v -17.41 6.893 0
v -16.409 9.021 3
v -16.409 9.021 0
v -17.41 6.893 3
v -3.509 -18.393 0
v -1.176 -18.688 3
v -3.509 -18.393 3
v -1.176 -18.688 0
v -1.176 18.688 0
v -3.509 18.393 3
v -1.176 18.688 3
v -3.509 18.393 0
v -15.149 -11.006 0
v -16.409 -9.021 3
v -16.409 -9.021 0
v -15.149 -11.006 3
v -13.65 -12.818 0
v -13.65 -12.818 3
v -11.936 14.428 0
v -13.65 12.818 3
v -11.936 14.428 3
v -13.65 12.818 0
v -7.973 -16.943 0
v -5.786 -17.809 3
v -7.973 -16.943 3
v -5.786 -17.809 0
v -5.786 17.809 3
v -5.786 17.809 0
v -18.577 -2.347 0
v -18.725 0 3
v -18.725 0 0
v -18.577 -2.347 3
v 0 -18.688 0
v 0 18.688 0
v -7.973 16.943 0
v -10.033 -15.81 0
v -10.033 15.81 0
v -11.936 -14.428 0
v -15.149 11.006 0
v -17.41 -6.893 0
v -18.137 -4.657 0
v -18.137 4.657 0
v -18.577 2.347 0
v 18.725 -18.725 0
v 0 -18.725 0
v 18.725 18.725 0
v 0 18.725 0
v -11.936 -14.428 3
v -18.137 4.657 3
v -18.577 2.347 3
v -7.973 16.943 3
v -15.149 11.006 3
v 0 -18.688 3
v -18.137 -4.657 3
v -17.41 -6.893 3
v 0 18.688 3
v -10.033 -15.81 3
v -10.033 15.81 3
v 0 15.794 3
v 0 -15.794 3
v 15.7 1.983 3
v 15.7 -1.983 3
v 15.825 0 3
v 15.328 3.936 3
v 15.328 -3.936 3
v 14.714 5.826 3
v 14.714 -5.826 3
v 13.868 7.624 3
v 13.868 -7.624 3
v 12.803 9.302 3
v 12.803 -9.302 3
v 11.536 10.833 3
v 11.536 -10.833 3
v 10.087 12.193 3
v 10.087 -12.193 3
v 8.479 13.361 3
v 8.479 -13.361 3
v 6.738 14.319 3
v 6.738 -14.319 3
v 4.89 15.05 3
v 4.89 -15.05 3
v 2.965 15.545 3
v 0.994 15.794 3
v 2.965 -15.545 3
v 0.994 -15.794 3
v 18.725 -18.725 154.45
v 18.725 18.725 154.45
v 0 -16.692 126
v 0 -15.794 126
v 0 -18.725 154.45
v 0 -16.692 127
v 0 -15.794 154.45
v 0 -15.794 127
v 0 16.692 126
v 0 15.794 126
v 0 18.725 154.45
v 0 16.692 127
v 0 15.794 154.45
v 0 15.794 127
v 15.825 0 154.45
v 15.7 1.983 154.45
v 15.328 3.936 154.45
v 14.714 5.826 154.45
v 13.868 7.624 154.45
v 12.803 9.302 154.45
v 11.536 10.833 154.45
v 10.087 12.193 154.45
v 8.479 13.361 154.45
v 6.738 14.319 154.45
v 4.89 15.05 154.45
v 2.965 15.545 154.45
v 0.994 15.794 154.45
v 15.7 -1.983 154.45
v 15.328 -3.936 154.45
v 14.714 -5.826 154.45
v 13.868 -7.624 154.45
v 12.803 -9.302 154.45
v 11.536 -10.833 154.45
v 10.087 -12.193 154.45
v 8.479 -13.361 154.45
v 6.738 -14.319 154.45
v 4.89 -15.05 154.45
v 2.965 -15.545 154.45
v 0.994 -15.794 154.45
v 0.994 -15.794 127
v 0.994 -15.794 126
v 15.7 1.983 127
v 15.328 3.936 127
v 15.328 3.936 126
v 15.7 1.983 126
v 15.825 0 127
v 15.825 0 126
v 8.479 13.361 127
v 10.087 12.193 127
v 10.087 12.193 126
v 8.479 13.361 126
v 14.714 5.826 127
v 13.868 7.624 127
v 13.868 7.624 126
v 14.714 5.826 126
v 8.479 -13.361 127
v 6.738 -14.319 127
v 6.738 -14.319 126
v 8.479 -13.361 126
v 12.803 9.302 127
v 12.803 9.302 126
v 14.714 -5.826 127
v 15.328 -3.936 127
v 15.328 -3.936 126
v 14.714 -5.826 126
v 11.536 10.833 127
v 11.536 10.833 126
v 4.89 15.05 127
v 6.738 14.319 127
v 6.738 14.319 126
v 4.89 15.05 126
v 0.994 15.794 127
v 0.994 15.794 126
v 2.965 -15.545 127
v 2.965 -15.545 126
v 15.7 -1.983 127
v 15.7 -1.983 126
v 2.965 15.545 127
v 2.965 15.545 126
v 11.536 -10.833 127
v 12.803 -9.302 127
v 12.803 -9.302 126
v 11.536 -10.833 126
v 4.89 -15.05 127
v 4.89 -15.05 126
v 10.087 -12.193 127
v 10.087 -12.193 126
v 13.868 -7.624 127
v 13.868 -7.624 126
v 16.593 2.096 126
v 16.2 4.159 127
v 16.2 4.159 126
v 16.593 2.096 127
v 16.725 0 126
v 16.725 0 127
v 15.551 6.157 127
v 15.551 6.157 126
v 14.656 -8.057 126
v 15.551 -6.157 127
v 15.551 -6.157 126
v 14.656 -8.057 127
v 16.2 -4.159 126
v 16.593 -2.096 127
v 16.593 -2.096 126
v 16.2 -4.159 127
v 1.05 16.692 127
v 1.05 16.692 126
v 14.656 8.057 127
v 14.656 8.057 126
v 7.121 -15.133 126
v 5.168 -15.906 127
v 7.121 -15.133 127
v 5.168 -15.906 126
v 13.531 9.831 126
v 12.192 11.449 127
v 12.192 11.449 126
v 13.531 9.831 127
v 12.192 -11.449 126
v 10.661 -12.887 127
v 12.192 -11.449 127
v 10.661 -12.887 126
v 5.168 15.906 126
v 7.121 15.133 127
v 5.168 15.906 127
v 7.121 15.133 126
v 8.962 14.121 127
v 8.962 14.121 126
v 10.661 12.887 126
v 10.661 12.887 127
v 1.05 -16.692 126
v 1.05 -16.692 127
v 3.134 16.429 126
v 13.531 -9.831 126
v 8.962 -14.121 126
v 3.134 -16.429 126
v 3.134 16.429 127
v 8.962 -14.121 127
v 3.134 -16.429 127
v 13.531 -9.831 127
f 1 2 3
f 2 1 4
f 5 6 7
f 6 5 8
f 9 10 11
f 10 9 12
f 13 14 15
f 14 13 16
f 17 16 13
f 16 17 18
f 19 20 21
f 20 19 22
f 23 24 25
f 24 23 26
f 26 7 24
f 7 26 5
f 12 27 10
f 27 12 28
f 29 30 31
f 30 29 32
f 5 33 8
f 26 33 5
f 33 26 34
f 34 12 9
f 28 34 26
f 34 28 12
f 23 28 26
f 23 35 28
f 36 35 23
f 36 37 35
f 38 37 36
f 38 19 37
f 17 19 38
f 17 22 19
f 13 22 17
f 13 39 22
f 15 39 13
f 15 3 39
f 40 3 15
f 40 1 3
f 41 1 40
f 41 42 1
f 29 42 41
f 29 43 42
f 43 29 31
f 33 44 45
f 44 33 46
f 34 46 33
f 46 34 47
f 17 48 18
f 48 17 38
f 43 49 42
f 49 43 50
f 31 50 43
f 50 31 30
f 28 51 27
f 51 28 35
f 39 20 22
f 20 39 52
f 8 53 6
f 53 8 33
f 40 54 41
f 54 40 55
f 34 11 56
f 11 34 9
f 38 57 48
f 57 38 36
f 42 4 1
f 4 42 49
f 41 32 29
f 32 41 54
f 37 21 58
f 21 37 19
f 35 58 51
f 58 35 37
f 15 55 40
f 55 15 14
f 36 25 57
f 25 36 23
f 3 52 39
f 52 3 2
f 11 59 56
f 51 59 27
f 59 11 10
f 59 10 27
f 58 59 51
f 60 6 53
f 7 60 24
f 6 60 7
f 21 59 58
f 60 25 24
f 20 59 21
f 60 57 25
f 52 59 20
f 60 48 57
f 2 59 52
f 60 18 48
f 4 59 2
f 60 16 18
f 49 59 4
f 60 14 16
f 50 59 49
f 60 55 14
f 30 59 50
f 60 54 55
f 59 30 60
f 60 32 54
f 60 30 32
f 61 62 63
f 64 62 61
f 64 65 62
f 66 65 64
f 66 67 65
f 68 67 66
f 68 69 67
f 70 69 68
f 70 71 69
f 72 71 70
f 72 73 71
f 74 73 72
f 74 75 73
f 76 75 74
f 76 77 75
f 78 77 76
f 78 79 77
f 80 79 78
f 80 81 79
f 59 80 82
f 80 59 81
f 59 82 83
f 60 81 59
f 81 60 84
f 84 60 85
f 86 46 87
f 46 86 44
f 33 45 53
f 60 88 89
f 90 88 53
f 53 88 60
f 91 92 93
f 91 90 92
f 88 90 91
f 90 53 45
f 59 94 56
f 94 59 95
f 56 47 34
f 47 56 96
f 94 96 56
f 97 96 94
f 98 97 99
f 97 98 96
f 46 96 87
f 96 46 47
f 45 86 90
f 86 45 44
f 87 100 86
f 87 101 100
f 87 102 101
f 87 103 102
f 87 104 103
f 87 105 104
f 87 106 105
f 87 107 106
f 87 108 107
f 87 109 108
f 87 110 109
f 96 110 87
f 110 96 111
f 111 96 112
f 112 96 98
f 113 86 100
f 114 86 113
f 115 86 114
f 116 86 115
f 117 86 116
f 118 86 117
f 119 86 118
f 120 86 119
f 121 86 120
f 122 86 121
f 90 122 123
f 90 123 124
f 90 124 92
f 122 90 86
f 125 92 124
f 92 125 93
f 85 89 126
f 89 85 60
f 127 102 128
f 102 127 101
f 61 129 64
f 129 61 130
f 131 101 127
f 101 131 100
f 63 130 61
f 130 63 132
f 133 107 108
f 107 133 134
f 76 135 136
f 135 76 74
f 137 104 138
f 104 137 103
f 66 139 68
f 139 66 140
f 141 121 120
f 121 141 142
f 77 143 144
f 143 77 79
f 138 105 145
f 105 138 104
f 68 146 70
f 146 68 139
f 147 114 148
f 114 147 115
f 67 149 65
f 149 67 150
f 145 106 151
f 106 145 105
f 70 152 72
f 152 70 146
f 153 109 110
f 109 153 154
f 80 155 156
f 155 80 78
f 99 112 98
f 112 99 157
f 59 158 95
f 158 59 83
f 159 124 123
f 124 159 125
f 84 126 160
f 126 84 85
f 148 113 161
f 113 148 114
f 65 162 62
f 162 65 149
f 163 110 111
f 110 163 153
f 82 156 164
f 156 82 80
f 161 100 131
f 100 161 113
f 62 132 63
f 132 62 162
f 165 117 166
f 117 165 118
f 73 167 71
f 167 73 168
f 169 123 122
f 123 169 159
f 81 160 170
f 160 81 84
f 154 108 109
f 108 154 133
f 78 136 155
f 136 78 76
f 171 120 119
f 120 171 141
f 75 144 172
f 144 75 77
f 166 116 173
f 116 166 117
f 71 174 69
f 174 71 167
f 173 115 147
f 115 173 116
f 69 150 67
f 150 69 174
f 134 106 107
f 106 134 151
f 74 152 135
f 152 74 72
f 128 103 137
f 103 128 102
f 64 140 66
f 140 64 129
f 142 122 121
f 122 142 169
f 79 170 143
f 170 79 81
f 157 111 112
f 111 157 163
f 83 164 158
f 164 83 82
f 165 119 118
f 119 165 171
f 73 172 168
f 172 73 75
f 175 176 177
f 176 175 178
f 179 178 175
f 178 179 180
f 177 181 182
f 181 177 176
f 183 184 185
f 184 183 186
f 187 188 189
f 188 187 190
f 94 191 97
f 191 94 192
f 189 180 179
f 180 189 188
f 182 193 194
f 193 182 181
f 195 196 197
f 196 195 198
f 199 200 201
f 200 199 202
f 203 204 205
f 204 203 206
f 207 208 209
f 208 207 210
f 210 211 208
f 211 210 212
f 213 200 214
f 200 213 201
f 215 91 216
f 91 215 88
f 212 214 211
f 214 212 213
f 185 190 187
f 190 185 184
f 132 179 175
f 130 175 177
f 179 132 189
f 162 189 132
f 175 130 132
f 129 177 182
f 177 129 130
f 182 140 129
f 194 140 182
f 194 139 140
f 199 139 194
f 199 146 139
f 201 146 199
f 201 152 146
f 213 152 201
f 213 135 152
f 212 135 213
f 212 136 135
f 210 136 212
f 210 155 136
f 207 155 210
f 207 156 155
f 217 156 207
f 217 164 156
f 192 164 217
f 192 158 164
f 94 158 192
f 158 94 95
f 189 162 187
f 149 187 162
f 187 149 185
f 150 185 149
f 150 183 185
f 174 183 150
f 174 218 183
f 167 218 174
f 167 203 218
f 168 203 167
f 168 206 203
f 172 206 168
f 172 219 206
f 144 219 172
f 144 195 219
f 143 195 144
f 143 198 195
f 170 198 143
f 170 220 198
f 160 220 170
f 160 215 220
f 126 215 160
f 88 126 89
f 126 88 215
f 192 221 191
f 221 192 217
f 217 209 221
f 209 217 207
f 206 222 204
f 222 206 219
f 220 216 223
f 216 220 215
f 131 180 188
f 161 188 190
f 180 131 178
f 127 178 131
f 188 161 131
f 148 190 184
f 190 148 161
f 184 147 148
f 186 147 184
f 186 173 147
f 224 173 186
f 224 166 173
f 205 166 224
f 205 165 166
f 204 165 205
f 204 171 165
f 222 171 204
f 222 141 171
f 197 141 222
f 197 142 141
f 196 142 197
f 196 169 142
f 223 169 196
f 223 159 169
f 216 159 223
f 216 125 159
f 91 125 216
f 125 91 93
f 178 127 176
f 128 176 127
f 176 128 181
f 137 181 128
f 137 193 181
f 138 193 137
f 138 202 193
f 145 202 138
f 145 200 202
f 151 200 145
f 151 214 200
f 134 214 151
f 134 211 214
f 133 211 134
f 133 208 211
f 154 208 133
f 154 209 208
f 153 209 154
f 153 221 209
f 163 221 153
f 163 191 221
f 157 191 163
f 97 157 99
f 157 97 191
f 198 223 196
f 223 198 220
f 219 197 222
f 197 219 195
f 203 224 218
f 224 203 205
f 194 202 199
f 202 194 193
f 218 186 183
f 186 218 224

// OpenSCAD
/*
	name: 		coin-tray.scad
	author:		Aymeric B.
	date:		20.06.2014
*/


/****** PARAMETERS ****/
$fn = 50;
print = 6;
thickness = 3;
clearance = 0.1;

// Coins dimensions array (5 cts, 50 cts, 10 cts, 20 cts, 1 chf, 2 chf, 5 chf)
coins_diameter = [17.15, 18.20, 19.15, 21.05, 23.20, 27.40, 31.45];
tray_height = [130, 65, 78, 86, 81, 112, 123];


/****** MODULES ****/
module Base(diameter) {
	cylinder(r=diameter/2+thickness, h=thickness);
	translate([0, -diameter/2-thickness, 0]) cube([diameter/2+thickness, diameter+2*thickness, thickness]);
}

module HalfPipe(diameter, height) {
	y_offset = -diameter/2-thickness;
	difference() {
		translate([0, y_offset, 0]) cube([diameter/2+thickness, diameter+2*thickness, height+diameter]);
		cylinder(r=diameter/2+clearance, h=height+diameter+2*thickness);
		translate([0, 0, height+thickness]) cylinder(r=diameter/2+1, h=1);
	}
}

module Tray(diameter, height) {
	union() {
		Base(diameter);
		HalfPipe(diameter, height);
	}
}

module Draw(index) {
	if (index>=0 && index<len(coins_diameter)) {
		echo ("Call Tray(x, y)");
		Tray(coins_diameter[index], tray_height[index]);
	} else {
		echo ("ERROR: index is out of the limits");
	}
}


/****** RENDERS ****/
Draw(print);
